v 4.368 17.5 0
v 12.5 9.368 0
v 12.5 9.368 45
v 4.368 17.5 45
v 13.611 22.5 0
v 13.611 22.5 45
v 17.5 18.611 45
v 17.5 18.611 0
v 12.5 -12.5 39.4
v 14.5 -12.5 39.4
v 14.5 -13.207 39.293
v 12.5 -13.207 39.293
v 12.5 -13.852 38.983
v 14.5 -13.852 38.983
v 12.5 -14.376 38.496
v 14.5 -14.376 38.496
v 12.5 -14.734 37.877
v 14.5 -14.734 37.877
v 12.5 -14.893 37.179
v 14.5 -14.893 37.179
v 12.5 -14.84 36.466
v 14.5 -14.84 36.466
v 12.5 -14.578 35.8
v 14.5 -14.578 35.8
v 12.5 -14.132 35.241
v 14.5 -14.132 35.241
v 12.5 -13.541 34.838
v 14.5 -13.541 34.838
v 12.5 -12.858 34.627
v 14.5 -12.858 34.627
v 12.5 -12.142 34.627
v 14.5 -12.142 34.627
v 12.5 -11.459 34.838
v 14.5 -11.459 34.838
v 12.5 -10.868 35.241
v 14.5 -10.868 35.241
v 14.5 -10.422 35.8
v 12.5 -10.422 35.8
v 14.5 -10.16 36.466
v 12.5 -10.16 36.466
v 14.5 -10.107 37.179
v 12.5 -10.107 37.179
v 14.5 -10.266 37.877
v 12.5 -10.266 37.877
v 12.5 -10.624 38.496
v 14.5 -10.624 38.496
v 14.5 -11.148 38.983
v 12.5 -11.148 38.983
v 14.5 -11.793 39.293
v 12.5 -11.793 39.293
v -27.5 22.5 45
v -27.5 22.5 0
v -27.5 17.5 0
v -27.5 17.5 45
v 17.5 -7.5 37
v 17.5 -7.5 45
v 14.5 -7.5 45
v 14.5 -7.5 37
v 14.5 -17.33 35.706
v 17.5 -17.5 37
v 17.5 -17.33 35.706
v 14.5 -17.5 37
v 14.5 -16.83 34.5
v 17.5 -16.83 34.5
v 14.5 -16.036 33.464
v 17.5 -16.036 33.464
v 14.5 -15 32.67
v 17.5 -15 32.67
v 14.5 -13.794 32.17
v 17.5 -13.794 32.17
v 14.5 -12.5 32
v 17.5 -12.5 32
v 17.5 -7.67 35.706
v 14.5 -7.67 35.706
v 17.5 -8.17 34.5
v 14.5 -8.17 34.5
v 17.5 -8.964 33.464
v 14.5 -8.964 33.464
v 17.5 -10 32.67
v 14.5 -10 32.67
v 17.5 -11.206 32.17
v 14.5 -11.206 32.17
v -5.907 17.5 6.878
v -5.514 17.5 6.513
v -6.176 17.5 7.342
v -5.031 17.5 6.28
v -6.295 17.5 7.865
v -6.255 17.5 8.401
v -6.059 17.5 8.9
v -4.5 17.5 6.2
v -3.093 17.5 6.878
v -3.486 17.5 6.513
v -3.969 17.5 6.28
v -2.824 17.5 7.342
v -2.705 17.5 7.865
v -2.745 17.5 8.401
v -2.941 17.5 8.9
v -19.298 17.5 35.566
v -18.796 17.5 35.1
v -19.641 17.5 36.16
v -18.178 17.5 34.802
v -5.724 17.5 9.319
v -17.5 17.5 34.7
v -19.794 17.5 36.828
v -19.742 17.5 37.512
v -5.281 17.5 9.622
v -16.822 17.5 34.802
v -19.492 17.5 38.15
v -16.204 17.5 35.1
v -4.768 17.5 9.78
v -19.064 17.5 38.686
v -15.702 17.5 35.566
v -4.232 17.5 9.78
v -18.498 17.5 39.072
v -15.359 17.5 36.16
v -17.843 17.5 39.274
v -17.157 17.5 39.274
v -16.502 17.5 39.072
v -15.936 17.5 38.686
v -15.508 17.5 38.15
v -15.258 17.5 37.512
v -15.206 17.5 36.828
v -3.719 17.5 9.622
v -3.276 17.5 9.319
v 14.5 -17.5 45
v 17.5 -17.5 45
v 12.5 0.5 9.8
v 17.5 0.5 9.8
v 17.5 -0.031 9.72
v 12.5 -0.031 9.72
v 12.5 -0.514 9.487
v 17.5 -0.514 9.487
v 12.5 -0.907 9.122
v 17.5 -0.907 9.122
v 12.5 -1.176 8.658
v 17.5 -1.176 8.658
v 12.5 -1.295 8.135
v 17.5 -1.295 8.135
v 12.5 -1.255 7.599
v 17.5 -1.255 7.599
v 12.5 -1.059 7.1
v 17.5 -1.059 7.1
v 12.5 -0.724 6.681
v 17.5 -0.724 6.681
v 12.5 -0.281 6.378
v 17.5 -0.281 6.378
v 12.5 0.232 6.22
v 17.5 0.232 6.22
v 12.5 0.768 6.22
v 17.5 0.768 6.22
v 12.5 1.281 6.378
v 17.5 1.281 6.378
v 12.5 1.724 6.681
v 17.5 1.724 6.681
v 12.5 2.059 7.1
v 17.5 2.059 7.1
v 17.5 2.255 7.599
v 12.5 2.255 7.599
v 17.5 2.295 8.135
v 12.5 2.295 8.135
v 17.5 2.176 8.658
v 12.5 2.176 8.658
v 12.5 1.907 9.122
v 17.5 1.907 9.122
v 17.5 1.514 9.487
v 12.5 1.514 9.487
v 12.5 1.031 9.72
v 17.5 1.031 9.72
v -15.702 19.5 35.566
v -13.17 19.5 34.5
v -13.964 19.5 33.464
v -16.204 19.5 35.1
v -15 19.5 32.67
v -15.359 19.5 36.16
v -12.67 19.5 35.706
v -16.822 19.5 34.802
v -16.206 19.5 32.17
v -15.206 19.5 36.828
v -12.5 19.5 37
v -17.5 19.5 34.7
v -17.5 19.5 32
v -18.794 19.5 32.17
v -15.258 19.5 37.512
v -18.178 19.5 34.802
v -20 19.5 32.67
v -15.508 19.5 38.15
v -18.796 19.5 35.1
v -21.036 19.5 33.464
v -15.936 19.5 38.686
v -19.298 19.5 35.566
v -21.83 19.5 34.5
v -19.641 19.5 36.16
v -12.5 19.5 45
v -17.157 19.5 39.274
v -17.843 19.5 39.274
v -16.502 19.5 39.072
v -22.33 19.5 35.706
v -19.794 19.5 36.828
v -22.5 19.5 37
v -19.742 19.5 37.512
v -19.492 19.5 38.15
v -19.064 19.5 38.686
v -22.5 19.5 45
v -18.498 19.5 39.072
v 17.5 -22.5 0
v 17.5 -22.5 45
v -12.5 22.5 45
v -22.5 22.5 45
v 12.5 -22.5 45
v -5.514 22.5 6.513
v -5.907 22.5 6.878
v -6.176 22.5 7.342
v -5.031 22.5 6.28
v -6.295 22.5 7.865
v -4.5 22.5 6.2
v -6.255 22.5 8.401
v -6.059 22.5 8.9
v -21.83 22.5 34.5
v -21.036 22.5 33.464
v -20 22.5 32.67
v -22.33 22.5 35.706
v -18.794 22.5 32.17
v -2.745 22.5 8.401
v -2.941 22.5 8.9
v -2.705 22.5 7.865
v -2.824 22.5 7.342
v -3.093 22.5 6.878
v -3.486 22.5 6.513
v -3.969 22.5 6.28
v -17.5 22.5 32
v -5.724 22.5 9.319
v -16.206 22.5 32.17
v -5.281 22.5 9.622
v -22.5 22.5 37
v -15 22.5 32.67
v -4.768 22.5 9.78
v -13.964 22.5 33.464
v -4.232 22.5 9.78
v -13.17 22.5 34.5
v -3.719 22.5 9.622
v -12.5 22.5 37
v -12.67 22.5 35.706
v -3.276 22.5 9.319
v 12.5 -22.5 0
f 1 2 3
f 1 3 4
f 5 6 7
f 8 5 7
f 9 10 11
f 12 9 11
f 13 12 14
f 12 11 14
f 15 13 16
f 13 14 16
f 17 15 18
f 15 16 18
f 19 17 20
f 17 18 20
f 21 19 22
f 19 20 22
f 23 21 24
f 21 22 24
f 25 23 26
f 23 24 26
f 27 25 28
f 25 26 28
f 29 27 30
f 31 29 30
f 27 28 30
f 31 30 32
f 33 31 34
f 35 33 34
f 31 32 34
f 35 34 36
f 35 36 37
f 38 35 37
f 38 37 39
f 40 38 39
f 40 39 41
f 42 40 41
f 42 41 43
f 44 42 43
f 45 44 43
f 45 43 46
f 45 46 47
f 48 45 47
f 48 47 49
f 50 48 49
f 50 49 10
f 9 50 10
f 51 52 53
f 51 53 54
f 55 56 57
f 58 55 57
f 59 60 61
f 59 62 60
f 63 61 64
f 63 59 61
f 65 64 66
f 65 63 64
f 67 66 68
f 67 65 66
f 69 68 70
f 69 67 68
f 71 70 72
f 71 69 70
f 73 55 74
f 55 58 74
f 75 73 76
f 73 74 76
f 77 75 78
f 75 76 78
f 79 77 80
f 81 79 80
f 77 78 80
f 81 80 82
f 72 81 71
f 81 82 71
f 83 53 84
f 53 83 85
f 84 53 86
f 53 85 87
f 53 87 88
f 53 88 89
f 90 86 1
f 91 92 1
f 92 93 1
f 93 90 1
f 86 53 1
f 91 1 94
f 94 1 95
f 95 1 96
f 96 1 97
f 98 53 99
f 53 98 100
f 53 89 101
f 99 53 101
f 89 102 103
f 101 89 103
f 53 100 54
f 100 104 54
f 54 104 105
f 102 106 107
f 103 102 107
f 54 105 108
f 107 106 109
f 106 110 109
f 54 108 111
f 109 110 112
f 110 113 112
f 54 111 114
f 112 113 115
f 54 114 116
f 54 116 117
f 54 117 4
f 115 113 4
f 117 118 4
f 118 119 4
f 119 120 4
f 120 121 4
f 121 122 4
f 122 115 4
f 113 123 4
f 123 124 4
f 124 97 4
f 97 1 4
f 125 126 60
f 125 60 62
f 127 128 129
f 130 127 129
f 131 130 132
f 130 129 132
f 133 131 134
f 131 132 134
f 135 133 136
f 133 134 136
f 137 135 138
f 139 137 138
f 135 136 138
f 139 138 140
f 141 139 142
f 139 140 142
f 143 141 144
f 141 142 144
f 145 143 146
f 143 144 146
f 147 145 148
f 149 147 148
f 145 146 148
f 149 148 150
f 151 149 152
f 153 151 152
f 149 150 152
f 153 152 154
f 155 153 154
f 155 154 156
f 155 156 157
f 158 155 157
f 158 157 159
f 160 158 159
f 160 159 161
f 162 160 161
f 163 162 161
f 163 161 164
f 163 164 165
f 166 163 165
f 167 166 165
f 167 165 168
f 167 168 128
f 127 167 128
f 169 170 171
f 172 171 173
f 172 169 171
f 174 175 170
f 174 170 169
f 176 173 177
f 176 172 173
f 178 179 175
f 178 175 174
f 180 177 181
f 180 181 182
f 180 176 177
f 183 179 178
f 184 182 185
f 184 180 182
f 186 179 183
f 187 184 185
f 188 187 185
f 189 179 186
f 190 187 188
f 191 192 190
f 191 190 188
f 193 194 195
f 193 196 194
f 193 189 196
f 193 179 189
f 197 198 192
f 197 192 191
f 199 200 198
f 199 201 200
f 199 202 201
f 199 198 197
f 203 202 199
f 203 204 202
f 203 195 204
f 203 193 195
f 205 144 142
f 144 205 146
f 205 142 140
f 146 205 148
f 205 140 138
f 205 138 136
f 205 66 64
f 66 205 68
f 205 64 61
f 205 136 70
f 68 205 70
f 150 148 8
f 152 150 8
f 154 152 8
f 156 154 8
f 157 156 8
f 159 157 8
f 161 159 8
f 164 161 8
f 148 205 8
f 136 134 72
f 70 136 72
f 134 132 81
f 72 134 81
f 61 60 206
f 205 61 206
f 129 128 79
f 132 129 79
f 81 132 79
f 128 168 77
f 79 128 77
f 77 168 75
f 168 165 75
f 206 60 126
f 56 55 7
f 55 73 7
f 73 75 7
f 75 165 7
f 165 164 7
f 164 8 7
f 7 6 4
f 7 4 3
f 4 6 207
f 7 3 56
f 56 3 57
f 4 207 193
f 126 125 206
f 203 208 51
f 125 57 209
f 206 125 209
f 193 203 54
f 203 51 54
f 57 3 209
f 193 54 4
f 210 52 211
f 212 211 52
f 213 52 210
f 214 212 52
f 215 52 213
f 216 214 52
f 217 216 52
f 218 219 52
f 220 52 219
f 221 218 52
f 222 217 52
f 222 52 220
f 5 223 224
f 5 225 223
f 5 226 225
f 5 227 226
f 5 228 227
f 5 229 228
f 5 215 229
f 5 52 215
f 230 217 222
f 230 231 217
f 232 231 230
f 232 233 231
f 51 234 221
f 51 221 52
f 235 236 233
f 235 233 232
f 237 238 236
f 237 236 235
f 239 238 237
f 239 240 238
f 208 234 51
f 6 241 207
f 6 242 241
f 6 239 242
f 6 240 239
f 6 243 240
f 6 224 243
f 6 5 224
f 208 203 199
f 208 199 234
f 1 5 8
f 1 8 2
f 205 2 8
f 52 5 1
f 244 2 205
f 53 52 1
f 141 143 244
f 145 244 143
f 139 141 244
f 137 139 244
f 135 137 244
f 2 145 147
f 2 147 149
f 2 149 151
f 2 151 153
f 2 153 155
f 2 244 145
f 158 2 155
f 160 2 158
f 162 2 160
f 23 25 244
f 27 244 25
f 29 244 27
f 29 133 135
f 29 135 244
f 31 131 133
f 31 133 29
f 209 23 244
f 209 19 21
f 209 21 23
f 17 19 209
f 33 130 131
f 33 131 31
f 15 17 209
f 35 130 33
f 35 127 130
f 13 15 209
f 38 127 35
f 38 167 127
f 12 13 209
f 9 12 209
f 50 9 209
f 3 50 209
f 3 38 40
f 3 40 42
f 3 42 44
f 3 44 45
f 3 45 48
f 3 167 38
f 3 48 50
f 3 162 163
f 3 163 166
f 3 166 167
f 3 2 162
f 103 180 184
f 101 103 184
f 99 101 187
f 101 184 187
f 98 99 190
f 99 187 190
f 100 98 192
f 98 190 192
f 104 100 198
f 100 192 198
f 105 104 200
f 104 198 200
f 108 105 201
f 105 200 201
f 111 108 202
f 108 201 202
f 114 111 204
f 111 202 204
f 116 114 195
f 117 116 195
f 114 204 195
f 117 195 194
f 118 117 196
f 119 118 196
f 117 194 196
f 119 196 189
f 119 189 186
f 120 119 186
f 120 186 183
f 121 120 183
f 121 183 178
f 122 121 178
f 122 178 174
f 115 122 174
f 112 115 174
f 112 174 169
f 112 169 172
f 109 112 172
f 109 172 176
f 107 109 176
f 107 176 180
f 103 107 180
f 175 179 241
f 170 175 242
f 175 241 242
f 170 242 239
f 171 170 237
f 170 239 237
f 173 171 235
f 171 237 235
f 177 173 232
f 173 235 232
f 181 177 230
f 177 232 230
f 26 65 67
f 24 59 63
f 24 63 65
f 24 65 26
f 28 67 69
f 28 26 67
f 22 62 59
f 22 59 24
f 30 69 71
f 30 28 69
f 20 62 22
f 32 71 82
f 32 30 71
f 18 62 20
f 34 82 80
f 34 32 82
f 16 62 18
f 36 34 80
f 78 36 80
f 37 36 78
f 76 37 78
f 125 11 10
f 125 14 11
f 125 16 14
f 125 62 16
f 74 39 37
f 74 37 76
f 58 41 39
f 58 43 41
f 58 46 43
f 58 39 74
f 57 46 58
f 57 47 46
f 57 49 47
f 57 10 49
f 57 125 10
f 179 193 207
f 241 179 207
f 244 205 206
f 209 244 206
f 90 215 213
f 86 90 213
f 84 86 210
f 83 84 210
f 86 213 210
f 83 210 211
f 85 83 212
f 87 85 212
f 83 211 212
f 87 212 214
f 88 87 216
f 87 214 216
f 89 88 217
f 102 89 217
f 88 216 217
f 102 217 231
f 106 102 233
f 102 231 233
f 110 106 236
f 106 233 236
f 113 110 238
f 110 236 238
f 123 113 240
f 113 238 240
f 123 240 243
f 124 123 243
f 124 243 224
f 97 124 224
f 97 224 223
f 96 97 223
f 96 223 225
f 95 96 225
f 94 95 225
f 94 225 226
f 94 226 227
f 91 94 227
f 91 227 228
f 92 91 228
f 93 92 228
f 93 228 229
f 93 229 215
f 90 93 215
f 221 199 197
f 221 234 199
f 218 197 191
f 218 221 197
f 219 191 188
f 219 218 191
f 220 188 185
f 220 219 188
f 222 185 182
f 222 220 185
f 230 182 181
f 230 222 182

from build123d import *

# Parameters (mm, degrees)
F0_W      = 45
F0_H      = 45
F1_DEPTH  = 5
F2_W      = 45
F2_H      = 5
F3_DEPTH  = 40
F5_DEPTH  = 45
F7_DEPTH  = 45.001
F9_R      = 1.8
F9_R_2    = 2.3
F10_DEPTH = 45.001
F11_R     = 2.4
F11_R_2   = 1.8
F12_DEPTH = 45.001
F13_W     = 10
F13_H     = 3
F13_W_2   = 3
F13_H_2   = 10
F14_DEPTH = 13
F15_R     = 4.99999
F16_ANGLE = -90


# Not quite as in the source:
# - a fillet or chamfer is up to 0.001 mm smaller than in the source, because OpenCascade refuses the exact size


with BuildPart() as f1:
    # F0 (on Top) → F1 (new body)
    with BuildSketch(Plane.XY):
        Rectangle(F0_W, F0_H)
    extrude(amount=F1_DEPTH)

    # F2 (on face) → F3 (join)
    with BuildSketch(Plane.XY.offset(5)):
        with Locations((0, 20)):
            Rectangle(F2_W, F2_H)
    extrude(amount=F3_DEPTH)

    # F4 (on face) → F5 (join, through all)
    with BuildSketch(Plane(origin=(-22.5, 0, 0), x_dir=(0, -1, 0), z_dir=(-1, 0, 0))):
        Polygon((-9.3682720164, 5), (-17.5, 13.1317279836), (-17.5, 5), align=None)
    extrude(amount=-F5_DEPTH)

    # F6 (on face) → F7 (cut, through all)
    with BuildSketch(Plane.YZ.offset(22.5)):
        Polygon((18.6109127035, 0), (22.5, 0), (22.5, 3.8890872965), align=None)
    extrude(amount=-F7_DEPTH, mode=Mode.SUBTRACT)

    # F9 (on face) → F10 (cut, through all)
    with BuildSketch(Plane(origin=(0, 22.5, 0), x_dir=(-1, 0, 0), z_dir=(0, 1, 0))):
        with Locations((14.5, 22)):
            Circle(F9_R)
        with Locations((-14.5, 35)):
            Circle(F9_R_2)
    extrude(amount=-F10_DEPTH, mode=Mode.SUBTRACT)

    # F11 (on face) → F12 (cut, through all)
    with BuildSketch(Plane(origin=(0, 0, 0), x_dir=(1, 0, 0), z_dir=(0, 0, -1))):
        with Locations((14.5, 12.5)):
            Circle(F11_R)
        with Locations((-14.5, -0.5)):
            Circle(F11_R_2)
    extrude(amount=-F12_DEPTH, mode=Mode.SUBTRACT)

    # F13 (on face) → F14 (cut)
    with BuildSketch(Plane.YZ.offset(22.5)):
        with Locations((-12.5, 1.5)):
            Rectangle(F13_W, F13_H)
        with Locations((21, 35)):
            Rectangle(F13_W_2, F13_H_2)
    extrude(amount=-F14_DEPTH, mode=Mode.SUBTRACT)

    # F15 (radius 5 in the source; OpenCascade refuses exactly that, so slightly less here)
    f15_edges = [f1.edges().sort_by_distance(p)[0] for p in [
        (9.5, -17.5, 1.5),
        (9.5, -7.5, 1.5),
        (9.5, 21, 30),
        (9.5, 21, 40),
    ]]
    fillet(f15_edges, radius=F15_R)


with BuildPart() as f1_1:
    # F16: moved
    add(f1.part.rotate(Axis((-22.5, -1.9445436483, 0), (0, 1, 0)), F16_ANGLE))


with BuildPart() as f1_2:
    # F17: moved
    add(f1_1.part.moved(Location((40, 0, 0))))


solid = f1_2.part
